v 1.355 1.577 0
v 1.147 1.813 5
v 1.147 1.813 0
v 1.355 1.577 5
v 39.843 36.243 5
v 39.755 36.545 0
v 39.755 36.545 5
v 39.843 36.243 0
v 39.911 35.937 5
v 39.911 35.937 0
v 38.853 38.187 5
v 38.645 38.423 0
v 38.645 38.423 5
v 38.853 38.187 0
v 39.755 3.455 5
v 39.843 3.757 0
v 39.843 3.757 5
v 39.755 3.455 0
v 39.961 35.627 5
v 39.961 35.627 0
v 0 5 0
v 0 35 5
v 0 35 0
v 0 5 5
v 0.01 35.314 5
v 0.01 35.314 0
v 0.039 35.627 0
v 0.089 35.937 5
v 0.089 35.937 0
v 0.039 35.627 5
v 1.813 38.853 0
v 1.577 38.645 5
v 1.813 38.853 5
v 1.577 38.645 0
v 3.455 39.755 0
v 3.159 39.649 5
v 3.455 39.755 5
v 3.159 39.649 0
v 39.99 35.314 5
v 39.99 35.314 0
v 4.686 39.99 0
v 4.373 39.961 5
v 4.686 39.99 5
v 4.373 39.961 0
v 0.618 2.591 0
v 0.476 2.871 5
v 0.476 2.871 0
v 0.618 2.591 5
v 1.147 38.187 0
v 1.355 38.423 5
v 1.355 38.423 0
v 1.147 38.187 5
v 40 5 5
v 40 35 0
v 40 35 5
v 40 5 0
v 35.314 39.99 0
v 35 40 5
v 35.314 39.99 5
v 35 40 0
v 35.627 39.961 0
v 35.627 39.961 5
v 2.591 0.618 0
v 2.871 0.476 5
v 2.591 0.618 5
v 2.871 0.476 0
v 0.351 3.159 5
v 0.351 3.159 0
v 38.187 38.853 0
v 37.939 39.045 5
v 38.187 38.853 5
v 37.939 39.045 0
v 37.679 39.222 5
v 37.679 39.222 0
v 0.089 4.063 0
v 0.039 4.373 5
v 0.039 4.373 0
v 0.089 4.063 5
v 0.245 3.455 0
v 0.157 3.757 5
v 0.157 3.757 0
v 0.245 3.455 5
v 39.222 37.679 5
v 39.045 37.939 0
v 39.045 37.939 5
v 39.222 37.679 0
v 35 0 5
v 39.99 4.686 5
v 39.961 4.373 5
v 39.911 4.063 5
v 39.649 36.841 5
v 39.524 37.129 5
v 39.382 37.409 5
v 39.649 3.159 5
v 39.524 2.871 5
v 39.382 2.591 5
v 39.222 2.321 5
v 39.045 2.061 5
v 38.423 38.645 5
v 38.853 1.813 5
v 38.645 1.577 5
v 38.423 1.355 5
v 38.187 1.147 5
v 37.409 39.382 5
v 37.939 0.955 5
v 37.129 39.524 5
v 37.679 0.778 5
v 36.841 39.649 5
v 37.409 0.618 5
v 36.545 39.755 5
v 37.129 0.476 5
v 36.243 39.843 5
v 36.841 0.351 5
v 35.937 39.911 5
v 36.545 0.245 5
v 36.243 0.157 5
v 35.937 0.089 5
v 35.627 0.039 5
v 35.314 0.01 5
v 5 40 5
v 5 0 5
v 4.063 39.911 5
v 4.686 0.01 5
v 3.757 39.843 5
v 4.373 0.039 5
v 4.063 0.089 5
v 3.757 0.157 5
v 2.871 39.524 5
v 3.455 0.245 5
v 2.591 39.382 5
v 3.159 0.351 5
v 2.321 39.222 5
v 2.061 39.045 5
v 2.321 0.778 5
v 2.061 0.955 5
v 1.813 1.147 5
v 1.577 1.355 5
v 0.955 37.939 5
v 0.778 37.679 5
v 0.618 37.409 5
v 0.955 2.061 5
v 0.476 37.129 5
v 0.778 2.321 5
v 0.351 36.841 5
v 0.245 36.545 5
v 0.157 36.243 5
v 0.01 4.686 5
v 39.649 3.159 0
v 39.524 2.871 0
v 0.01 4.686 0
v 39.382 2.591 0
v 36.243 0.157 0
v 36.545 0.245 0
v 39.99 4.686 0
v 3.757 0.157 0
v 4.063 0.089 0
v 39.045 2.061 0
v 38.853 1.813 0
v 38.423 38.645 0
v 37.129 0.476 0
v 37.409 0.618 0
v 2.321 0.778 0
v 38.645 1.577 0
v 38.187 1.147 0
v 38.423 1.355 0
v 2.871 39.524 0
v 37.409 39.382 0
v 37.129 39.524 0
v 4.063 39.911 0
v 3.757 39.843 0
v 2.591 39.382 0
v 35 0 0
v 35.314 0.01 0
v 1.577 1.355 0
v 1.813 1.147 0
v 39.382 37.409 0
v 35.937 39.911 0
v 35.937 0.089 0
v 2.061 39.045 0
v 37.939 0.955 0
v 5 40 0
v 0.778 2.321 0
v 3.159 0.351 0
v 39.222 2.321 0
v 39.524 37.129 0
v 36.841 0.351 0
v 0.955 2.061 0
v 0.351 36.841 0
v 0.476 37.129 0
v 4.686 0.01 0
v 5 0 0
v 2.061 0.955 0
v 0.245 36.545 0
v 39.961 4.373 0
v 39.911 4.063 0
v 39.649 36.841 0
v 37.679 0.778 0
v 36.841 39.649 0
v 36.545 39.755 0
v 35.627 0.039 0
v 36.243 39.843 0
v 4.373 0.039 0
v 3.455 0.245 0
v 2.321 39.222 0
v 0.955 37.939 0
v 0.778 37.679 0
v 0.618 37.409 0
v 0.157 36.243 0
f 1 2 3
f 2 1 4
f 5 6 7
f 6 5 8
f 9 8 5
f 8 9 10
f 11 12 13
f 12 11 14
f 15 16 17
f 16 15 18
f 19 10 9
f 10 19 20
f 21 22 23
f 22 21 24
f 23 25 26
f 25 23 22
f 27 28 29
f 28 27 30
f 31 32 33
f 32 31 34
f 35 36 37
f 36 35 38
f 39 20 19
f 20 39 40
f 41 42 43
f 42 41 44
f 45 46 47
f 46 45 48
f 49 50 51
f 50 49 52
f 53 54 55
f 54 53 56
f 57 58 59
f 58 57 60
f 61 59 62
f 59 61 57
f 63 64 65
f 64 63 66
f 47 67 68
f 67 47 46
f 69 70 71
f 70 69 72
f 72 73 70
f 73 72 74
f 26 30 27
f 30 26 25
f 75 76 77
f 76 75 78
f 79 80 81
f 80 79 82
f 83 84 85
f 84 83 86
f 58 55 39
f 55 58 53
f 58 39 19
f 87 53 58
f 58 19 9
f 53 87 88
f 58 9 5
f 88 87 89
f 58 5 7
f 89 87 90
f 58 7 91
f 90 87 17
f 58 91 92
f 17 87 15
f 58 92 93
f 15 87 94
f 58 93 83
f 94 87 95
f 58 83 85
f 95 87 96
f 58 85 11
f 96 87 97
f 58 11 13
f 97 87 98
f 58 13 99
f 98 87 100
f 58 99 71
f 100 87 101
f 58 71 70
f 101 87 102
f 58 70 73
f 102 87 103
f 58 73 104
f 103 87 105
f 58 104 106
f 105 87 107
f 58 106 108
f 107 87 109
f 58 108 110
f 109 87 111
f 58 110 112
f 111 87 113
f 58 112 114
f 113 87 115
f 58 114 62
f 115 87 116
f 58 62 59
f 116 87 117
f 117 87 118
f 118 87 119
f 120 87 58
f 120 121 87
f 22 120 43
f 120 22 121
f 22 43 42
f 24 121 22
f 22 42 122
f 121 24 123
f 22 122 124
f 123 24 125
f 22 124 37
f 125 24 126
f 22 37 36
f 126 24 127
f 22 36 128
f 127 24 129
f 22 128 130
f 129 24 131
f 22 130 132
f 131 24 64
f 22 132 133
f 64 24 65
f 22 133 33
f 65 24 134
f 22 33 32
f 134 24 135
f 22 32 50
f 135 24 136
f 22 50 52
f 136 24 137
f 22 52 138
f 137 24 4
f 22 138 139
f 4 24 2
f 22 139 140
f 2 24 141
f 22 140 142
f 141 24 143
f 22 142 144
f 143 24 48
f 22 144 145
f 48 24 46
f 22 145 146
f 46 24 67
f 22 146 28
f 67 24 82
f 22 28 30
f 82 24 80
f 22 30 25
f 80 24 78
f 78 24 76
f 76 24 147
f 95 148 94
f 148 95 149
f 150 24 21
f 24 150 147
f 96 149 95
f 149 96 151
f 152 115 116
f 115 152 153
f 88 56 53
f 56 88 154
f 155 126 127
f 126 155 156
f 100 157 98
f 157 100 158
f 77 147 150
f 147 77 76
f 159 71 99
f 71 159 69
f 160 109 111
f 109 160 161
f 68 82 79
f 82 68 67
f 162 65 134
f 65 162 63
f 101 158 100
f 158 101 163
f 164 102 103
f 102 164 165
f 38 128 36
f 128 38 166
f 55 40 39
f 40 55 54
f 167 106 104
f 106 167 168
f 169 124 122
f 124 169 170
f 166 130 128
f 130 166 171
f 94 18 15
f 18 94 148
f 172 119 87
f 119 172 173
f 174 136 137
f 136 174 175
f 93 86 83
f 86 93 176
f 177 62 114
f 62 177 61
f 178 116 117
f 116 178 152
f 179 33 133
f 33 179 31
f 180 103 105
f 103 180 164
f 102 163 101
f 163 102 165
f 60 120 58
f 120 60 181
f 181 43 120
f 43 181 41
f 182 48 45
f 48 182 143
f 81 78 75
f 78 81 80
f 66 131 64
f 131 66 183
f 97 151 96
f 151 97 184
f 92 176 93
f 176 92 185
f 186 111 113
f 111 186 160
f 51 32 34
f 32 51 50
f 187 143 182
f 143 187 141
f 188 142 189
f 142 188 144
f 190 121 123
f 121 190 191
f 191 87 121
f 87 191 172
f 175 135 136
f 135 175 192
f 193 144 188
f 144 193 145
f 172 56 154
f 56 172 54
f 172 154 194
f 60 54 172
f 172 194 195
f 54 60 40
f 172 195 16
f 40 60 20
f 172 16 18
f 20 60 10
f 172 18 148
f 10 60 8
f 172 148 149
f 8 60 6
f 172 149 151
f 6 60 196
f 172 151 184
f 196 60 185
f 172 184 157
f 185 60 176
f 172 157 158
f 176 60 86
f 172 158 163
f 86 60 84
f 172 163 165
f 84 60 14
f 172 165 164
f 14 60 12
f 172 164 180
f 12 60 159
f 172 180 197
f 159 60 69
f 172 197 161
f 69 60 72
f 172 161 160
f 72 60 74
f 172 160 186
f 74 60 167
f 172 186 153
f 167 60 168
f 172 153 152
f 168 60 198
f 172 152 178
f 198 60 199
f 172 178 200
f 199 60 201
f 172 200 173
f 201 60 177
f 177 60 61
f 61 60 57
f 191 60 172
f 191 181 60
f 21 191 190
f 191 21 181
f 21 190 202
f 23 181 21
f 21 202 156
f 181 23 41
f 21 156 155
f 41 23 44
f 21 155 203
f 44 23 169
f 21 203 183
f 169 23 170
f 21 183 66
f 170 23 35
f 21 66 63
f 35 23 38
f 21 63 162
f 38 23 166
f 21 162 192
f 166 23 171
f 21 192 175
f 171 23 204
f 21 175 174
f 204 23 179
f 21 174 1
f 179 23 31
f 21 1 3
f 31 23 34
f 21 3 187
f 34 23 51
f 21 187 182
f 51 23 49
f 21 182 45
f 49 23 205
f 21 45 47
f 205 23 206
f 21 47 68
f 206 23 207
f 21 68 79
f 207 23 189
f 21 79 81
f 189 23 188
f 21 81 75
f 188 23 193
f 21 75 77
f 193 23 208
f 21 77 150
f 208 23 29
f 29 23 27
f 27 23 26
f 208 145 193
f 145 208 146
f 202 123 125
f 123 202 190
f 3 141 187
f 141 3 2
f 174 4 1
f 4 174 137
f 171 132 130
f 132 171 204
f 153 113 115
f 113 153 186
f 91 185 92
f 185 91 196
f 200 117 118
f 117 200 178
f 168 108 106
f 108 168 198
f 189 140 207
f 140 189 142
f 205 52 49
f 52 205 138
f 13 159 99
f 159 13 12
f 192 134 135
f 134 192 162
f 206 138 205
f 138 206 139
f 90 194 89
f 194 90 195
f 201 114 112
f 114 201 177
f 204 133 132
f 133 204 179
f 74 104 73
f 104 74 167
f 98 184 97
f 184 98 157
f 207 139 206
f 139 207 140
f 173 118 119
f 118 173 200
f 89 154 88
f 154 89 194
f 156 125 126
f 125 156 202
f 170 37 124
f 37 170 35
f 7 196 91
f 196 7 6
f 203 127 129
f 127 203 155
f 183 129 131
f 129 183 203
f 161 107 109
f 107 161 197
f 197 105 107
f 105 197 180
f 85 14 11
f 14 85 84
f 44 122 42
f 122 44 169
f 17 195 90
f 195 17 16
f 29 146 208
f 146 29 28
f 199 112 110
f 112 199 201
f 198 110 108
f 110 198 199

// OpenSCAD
// file: ../common/math.scad
//
// just some useful general math utilities
//

//
// min() and max() give you the lower or higher of their arguments,
// respectively.  They behave asymmetrically at 0, so as to establish a
// stable sort order, merely reversed, no matter which order the inputs come
// in.
//
// contributed by @vathpela
//
function min(x, y) = y > x ? x : y;
function max(x, y) = x >= y ? x : y;

//
// logx(x, b) is log base x of b aka logX(b)
//
// *sigh*, openscad's math primitives are so defective
//
// contributed by @vathpela
//
function logx(x, b) = log(x) / log(b);
// file: ../common/shapes.scad
/*
  author: Christopher O'Brien  <obriencj@gmail.com>
  license: GPL v3
*/


function shared_tangents(p1, p2) =
    let(r1 = p1[2],
        r2 = p2[2],
        dx = p2.x - p1.x,
        dy = p2.y - p1.y,
        d = sqrt(dx * dx + dy * dy),
        theta = atan2(dy, dx) + acos((r1 - r2) / d),
        xa = p1.x +(cos(theta) * r1),
        ya = p1.y +(sin(theta) * r1),
        xb = p2.x +(cos(theta) * r2),
        yb = p2.y +(sin(theta) * r2))
     [ [xa, ya], [xb, yb] ];



module _rounded_polygon(points, $fn=100) {
/*
  each point is [x, y, r] of a circle

  adapted from
  http://forum.openscad.org/Script-to-replicate-hull-and-minkoswki-for-CSG-export-import-into-FreeCAD-td16537.html#a16556
*/

     p_len = len(points);

     function p_tang(index) =
	  shared_tangents(points[index], points[(index + 1) % p_len]);

     // all the positive radius circles
     for(p = points) {
	  if(p[2] > 0) {
	       translate([p.x, p.y]) {
		    circle(p[2]);
	       };
	  };
     };

     difference() {
	  // a polygon connecting the tangent points between all
	  // circles in order
	  polygon([for(i = [0: p_len - 1]) for(e = p_tang(i)) e]);

	  // then subtract all the negative radius circles
	  for(p = points) {
	       if(p[2] < 0) {
		    translate([p.x, p.y]) {
			 circle(-p[2]);
		    };
	       };
	  };
     };
}


module rounded_polygon(points, thick=0, $fn=100) {
     /*
       each point in points is a vector of [x, y, r] where r is
       positive to indicate that it is an interior point, and negative
       to indicate it is an exterior point.
     */

     if(thick) {
	  linear_extrude(thick) {
	       _rounded_polygon(points, $fn);
	  };
     } else {
	  _rounded_polygon(points, $fn);
     };
}


function _r_adj(r, adj) =
     let(ra = r + adj) (r > 0)? max(0, ra): ra;


function adj_rounded_poly(points, adj) =
     [for(p=points) [p.x, p.y, _r_adj(p[2], adj)]];


module rounded_inset_poly(points, inset, thick, lip=undef) {
     tl = lip? (thick - lip): (thick / 2);

     rounded_polygon(points, tl);
     translate([0, 0, tl]) {
	  rounded_polygon(adj_rounded_poly(points, -inset),
			  thick - tl);
     };
}


module rounded_outset_poly(points, inset, thick, lip=undef) {
     tl = lip? (thick - lip): (thick / 2);

     rounded_polygon(points, tl);
     rounded_hollow_poly(points, inset, thick);
}


module rounded_hollow_poly(points, inset, thick) {
     linear_extrude(thick) {
	  difference() {
	       rounded_polygon(points);
	       rounded_polygon(adj_rounded_poly(points, -inset));
	  };
     };
}


/**
   A cylinder with a bore through it

   * barrel_r is the exterior radius
   * barrel_h is the overall height
   * bore_r is the interior radius
*/
module barrel(barrel_r, barrel_h, bore_r, $fn=100) {
     linear_extrude(barrel_h) {
	  difference() {
	       circle(barrel_r);
	       circle(bore_r);
	  };
     };
}


/**
   A ring with a circular profile.

   * ring_ir is the interior radius
   * cross_r is the radius of the cross-section
*/
module o_ring(ring_ir, cross_r, $fn=100) {
     rotate_extrude(angle=360) {
	  translate([ring_ir + cross_r, 0, 0]) {
	       circle(cross_r);
	  };
     };
}


/**
   A ring with a D shaped profile.

   * ring_ir is the interior radius
   * cross_r is the radius of the cross-section, before being affected
   by the factor.
   * The factor describes how much of a circle is being presented in
   the cross-section. A factor of 1 is equivalent of an oring.
*/
module d_ring(ring_ir, cross_r, factor=0.25, $fn=100) {

     factor_shift = (cross_r * 2 * factor) - cross_r;

     rotate_extrude(angle=360) {
	  difference() {
	       translate([ring_ir + factor_shift , 0, 0]) {
		    circle(cross_r);
	       };
	       square([ring_ir * 2, ring_ir * 2], true);
	  };
     };
}



module rounded_plate(width, depth, height, turn_r=5.1, $fn=50) {
     turn_d = turn_r * 2;

     translate([turn_r, turn_r, 0]) {
	  linear_extrude(height) {
	       minkowski() {
		    square([width - turn_d, depth - turn_d]);
		    circle(turn_r);
	       };
	  };
     };
}


module rounded_box(width, depth, height, turn_r=5, $fn=50) {
     turn_d = turn_r * 2;

     translate([turn_r, turn_r, turn_r]) {
	  minkowski() {
	       cube([width - turn_d, depth - turn_d, height - turn_d]);
	       sphere(turn_r);
	  };
     };
}


// The end.
// file: ../common/copies.scad
/*
  author: Christopher O'Brien  <obriencj@gmail.com>
  license: GPL v3
*/
use <../common/math.scad>

module copy_mirror(plane=[0, 0, 1]) {
     children();
     mirror(plane) children();
}


module copy_translate(x=0, y=0, z=0, copies=1) {
     if(copies) {
	  for(i = [0:copies]) {
	       translate([x * i, y * i, z * i]) {
		    children();
	       };
	  };
     } else {
	  children();
     };
}


module copy_rotate(x=0, y=0, z=0, copies=1) {
     if(copies) {
	  for(i = [0:copies]) {
	       rotate([x * i, y * i, z * i]) {
		    children();
	       };
	  };
     } else {
	  children();
     };
}


module copy_grid(offsets=[0, 0, 0], grid=[1, 1, 1]) {
     copy_translate(x=offsets.x, copies=grid.x-1) {
	  copy_translate(y=offsets.y, copies=grid.y-1) {
	       copy_translate(z=offsets.z, copies=grid.z-1) {
		    children();
	       };
	  };
     };
}


module duplicate(move_v=[0,0,0], rotate_v=[0,0,0]) {
     children();
     translate(move_v) {
	  rotate(rotate_v) {
	       children();
	  };
     };
}


//
// isomers() builds stereoisometric copies, horrifyingly laid out on the xy
// plane.
//
// you can specify how many copies with n=<NUMBER> or ns[xN, yN, zN],
// n=1 is the same as ns=[1, 0, 0]
// If the single n is nonzero, it is used, else the vector is.
//
// This is astonishingly close to actual n-dimensional chess.  You probably
// only want to choose n>1 on 2 or fewer planes at the same time. Inputs:
//
// contributed by @vathpela
//
module isomers(n=0, ns=[1, 0, 0], size=[1, 1, 1], debug=false)
{
    nm = [n ? n : ns[0], n ? 1 : ns[1], n ? 1 : ns[2]];

    xn = max(nm[0], 1);
    yn = max(nm[1], 1);
    zn = max(nm[2], 1);
    if (debug)
        echo("[xn,yn,zn]", [xn,yn,zn]);
    m = logn(xn*yn*zn, 2);

    xs = size[0];
    ys = size[1];
    zs = size[2];
    if (debug)
        echo("[xs,ys,zs]", [xs,ys,zs]);

    module zmirrorshift(origin=[0, 0, 0], x, y)
    {
        if (debug)
            echo("zmirror origin", origin);
        for (z = [0:1:zn-1])
        {
            shift0 = [origin[0] + xs/2 * 1.2 * (z-0.5)*-zn,
                      origin[1],
                      origin[2] + zs];
            shift1 = [origin[0] + xs/2 * 1.2 * (z-3.5)*zn - (xn) * xs * 1.2,
                      origin[1],
                      origin[2]];
            shift2 = [origin[0] + xs/2 * 1.2 * (z-0.5)*-zn,
                      origin[1],
                      origin[2]];

            if (z % 2 == 0 && zn != 1) {
                if (debug)
                    echo("za [z]", [z], "[zs]", [zs], "t([x,y,z])", shift0);
                translate(shift0) mirror([0, 0, 1]) children();
            } else {
                if (debug)
                    echo("zb [z]", [z], "[zs]", [zs], "t([x,y,z])", shift1);
                translate(zn == 1 ? shift2 : shift1) children();
            }
        }
    }

    module ymirrorshift(origin=[0, 0, 0], x)
    {
        if (debug)
            echo("ymirror origin", origin);
        for (y = [0:1:yn-1])
        {
            shift=[origin[0],
                   origin[1] + y * ys * 1.2,
                   origin[2]];
            if (debug)
                echo("ya [x,y,z]", [x,y,0], "[ys,zs]", [ys,zs], "t([x,y,z])", shift);
            if (y % 2 == 0) {
                zmirrorshift(shift, x, y) mirror([0, 1, 0]) children();
            } else {
                zmirrorshift(shift, x, y) children();
            }
        }
    }

    module xmirrorshift(origin=[0, 0, 0])
    {
        if (debug)
            echo("xmirror origin", origin);
        for (x = [0:1:xn-1])
        {
            shift=[origin[0] + x * xs * 1.2,
                   origin[1],
                   origin[2]];
            if (debug)
                echo("xa [x,y,z]", [x,0,0],
                     "[xs,ys,zs]", [xs,ys,zs],
                     "t([x,y,z])", shift);
            if (x % 2 == 0) {
                ymirrorshift(shift, x) mirror([1, 0, 0]) children();
            } else {
                ymirrorshift(shift, x) children();
            }
        }
    }

    xmirrorshift() children();
}

// The end.
// file: tileframe.scad
use <../common/copies.scad>;
use <../common/shapes.scad>;


module rectangle_rounded_tile(x, y, thick, r) {
     overthick = thick + (2 * r);
     intersection() {
          translate([0, 0, -(overthick - thick)]) {
               rounded_box(x, y, overthick, r, $fn=100);
          };
          cube([x, y, thick]);
     }
}


module square_rounded_tile(xy, thick, r) {
     rectangle_rounded_tile(xy, xy, thick, r);
}


module single_square_rounded(xy, thick, r, frame_thick=5) {
     outer_xy = xy + (2 * frame_thick);
     inner_xy = xy - (2 * r);

     difference() {
          cube([outer_xy, outer_xy, (thick + frame_thick)]);

	  translate([frame_thick + r, frame_thick + r, 0.01]) {
	       rounded_plate(inner_xy, inner_xy,
			     thick + frame_thick, r,
			     $fn=100);
	  };

          translate([frame_thick, frame_thick, -0.01]) {
               square_rounded_tile(xy, thick, r);
          };
     }
}


module quad_square_rounded(xy, thick, r, frame_thick=5) {
     copy_grid(offsets=[xy + frame_thick, xy + frame_thick, 0],
               grid=[2, 2, 1]) {
          single_square_rounded(xy, thick, r, frame_thick);
     };
}


module single_square_rounded_frame_plate(xy, thick, r, frame_thick=5) {
     inner_xy = xy - (2 * r);
     rounded_plate(inner_xy, inner_xy,
		   frame_thick, r,
		   $fn=100);
}


module embossed(image, xy, thick, r, frame_thick=5) {
     difference() {
	  single_square_rounded_frame_plate(50, 8, 5);
	  translate([20, 20, 6]) {
	       mirror([1, 0, 0]) {
		    mirror([0, 0, 1]) {
			 resize([40.01, 40.01, 2])
			      surface(file=image, center=true, $fn=100);
			 };
		    };
	       };
     };
}


// square_rounded_tile(50, 5, 5);

mirror([0, 0, 1]) quad_square_rounded(50, 5, 5);

// translate([-80, 0, 0]) single_square_rounded_frame_plate(50, 5, 5);
// embossed("smoosh.png", 50, 5, 5);


// The end.
// main file
use <tileframe.scad>;


embossed("smoosh.png", 50, 5, 5);


// The end.
